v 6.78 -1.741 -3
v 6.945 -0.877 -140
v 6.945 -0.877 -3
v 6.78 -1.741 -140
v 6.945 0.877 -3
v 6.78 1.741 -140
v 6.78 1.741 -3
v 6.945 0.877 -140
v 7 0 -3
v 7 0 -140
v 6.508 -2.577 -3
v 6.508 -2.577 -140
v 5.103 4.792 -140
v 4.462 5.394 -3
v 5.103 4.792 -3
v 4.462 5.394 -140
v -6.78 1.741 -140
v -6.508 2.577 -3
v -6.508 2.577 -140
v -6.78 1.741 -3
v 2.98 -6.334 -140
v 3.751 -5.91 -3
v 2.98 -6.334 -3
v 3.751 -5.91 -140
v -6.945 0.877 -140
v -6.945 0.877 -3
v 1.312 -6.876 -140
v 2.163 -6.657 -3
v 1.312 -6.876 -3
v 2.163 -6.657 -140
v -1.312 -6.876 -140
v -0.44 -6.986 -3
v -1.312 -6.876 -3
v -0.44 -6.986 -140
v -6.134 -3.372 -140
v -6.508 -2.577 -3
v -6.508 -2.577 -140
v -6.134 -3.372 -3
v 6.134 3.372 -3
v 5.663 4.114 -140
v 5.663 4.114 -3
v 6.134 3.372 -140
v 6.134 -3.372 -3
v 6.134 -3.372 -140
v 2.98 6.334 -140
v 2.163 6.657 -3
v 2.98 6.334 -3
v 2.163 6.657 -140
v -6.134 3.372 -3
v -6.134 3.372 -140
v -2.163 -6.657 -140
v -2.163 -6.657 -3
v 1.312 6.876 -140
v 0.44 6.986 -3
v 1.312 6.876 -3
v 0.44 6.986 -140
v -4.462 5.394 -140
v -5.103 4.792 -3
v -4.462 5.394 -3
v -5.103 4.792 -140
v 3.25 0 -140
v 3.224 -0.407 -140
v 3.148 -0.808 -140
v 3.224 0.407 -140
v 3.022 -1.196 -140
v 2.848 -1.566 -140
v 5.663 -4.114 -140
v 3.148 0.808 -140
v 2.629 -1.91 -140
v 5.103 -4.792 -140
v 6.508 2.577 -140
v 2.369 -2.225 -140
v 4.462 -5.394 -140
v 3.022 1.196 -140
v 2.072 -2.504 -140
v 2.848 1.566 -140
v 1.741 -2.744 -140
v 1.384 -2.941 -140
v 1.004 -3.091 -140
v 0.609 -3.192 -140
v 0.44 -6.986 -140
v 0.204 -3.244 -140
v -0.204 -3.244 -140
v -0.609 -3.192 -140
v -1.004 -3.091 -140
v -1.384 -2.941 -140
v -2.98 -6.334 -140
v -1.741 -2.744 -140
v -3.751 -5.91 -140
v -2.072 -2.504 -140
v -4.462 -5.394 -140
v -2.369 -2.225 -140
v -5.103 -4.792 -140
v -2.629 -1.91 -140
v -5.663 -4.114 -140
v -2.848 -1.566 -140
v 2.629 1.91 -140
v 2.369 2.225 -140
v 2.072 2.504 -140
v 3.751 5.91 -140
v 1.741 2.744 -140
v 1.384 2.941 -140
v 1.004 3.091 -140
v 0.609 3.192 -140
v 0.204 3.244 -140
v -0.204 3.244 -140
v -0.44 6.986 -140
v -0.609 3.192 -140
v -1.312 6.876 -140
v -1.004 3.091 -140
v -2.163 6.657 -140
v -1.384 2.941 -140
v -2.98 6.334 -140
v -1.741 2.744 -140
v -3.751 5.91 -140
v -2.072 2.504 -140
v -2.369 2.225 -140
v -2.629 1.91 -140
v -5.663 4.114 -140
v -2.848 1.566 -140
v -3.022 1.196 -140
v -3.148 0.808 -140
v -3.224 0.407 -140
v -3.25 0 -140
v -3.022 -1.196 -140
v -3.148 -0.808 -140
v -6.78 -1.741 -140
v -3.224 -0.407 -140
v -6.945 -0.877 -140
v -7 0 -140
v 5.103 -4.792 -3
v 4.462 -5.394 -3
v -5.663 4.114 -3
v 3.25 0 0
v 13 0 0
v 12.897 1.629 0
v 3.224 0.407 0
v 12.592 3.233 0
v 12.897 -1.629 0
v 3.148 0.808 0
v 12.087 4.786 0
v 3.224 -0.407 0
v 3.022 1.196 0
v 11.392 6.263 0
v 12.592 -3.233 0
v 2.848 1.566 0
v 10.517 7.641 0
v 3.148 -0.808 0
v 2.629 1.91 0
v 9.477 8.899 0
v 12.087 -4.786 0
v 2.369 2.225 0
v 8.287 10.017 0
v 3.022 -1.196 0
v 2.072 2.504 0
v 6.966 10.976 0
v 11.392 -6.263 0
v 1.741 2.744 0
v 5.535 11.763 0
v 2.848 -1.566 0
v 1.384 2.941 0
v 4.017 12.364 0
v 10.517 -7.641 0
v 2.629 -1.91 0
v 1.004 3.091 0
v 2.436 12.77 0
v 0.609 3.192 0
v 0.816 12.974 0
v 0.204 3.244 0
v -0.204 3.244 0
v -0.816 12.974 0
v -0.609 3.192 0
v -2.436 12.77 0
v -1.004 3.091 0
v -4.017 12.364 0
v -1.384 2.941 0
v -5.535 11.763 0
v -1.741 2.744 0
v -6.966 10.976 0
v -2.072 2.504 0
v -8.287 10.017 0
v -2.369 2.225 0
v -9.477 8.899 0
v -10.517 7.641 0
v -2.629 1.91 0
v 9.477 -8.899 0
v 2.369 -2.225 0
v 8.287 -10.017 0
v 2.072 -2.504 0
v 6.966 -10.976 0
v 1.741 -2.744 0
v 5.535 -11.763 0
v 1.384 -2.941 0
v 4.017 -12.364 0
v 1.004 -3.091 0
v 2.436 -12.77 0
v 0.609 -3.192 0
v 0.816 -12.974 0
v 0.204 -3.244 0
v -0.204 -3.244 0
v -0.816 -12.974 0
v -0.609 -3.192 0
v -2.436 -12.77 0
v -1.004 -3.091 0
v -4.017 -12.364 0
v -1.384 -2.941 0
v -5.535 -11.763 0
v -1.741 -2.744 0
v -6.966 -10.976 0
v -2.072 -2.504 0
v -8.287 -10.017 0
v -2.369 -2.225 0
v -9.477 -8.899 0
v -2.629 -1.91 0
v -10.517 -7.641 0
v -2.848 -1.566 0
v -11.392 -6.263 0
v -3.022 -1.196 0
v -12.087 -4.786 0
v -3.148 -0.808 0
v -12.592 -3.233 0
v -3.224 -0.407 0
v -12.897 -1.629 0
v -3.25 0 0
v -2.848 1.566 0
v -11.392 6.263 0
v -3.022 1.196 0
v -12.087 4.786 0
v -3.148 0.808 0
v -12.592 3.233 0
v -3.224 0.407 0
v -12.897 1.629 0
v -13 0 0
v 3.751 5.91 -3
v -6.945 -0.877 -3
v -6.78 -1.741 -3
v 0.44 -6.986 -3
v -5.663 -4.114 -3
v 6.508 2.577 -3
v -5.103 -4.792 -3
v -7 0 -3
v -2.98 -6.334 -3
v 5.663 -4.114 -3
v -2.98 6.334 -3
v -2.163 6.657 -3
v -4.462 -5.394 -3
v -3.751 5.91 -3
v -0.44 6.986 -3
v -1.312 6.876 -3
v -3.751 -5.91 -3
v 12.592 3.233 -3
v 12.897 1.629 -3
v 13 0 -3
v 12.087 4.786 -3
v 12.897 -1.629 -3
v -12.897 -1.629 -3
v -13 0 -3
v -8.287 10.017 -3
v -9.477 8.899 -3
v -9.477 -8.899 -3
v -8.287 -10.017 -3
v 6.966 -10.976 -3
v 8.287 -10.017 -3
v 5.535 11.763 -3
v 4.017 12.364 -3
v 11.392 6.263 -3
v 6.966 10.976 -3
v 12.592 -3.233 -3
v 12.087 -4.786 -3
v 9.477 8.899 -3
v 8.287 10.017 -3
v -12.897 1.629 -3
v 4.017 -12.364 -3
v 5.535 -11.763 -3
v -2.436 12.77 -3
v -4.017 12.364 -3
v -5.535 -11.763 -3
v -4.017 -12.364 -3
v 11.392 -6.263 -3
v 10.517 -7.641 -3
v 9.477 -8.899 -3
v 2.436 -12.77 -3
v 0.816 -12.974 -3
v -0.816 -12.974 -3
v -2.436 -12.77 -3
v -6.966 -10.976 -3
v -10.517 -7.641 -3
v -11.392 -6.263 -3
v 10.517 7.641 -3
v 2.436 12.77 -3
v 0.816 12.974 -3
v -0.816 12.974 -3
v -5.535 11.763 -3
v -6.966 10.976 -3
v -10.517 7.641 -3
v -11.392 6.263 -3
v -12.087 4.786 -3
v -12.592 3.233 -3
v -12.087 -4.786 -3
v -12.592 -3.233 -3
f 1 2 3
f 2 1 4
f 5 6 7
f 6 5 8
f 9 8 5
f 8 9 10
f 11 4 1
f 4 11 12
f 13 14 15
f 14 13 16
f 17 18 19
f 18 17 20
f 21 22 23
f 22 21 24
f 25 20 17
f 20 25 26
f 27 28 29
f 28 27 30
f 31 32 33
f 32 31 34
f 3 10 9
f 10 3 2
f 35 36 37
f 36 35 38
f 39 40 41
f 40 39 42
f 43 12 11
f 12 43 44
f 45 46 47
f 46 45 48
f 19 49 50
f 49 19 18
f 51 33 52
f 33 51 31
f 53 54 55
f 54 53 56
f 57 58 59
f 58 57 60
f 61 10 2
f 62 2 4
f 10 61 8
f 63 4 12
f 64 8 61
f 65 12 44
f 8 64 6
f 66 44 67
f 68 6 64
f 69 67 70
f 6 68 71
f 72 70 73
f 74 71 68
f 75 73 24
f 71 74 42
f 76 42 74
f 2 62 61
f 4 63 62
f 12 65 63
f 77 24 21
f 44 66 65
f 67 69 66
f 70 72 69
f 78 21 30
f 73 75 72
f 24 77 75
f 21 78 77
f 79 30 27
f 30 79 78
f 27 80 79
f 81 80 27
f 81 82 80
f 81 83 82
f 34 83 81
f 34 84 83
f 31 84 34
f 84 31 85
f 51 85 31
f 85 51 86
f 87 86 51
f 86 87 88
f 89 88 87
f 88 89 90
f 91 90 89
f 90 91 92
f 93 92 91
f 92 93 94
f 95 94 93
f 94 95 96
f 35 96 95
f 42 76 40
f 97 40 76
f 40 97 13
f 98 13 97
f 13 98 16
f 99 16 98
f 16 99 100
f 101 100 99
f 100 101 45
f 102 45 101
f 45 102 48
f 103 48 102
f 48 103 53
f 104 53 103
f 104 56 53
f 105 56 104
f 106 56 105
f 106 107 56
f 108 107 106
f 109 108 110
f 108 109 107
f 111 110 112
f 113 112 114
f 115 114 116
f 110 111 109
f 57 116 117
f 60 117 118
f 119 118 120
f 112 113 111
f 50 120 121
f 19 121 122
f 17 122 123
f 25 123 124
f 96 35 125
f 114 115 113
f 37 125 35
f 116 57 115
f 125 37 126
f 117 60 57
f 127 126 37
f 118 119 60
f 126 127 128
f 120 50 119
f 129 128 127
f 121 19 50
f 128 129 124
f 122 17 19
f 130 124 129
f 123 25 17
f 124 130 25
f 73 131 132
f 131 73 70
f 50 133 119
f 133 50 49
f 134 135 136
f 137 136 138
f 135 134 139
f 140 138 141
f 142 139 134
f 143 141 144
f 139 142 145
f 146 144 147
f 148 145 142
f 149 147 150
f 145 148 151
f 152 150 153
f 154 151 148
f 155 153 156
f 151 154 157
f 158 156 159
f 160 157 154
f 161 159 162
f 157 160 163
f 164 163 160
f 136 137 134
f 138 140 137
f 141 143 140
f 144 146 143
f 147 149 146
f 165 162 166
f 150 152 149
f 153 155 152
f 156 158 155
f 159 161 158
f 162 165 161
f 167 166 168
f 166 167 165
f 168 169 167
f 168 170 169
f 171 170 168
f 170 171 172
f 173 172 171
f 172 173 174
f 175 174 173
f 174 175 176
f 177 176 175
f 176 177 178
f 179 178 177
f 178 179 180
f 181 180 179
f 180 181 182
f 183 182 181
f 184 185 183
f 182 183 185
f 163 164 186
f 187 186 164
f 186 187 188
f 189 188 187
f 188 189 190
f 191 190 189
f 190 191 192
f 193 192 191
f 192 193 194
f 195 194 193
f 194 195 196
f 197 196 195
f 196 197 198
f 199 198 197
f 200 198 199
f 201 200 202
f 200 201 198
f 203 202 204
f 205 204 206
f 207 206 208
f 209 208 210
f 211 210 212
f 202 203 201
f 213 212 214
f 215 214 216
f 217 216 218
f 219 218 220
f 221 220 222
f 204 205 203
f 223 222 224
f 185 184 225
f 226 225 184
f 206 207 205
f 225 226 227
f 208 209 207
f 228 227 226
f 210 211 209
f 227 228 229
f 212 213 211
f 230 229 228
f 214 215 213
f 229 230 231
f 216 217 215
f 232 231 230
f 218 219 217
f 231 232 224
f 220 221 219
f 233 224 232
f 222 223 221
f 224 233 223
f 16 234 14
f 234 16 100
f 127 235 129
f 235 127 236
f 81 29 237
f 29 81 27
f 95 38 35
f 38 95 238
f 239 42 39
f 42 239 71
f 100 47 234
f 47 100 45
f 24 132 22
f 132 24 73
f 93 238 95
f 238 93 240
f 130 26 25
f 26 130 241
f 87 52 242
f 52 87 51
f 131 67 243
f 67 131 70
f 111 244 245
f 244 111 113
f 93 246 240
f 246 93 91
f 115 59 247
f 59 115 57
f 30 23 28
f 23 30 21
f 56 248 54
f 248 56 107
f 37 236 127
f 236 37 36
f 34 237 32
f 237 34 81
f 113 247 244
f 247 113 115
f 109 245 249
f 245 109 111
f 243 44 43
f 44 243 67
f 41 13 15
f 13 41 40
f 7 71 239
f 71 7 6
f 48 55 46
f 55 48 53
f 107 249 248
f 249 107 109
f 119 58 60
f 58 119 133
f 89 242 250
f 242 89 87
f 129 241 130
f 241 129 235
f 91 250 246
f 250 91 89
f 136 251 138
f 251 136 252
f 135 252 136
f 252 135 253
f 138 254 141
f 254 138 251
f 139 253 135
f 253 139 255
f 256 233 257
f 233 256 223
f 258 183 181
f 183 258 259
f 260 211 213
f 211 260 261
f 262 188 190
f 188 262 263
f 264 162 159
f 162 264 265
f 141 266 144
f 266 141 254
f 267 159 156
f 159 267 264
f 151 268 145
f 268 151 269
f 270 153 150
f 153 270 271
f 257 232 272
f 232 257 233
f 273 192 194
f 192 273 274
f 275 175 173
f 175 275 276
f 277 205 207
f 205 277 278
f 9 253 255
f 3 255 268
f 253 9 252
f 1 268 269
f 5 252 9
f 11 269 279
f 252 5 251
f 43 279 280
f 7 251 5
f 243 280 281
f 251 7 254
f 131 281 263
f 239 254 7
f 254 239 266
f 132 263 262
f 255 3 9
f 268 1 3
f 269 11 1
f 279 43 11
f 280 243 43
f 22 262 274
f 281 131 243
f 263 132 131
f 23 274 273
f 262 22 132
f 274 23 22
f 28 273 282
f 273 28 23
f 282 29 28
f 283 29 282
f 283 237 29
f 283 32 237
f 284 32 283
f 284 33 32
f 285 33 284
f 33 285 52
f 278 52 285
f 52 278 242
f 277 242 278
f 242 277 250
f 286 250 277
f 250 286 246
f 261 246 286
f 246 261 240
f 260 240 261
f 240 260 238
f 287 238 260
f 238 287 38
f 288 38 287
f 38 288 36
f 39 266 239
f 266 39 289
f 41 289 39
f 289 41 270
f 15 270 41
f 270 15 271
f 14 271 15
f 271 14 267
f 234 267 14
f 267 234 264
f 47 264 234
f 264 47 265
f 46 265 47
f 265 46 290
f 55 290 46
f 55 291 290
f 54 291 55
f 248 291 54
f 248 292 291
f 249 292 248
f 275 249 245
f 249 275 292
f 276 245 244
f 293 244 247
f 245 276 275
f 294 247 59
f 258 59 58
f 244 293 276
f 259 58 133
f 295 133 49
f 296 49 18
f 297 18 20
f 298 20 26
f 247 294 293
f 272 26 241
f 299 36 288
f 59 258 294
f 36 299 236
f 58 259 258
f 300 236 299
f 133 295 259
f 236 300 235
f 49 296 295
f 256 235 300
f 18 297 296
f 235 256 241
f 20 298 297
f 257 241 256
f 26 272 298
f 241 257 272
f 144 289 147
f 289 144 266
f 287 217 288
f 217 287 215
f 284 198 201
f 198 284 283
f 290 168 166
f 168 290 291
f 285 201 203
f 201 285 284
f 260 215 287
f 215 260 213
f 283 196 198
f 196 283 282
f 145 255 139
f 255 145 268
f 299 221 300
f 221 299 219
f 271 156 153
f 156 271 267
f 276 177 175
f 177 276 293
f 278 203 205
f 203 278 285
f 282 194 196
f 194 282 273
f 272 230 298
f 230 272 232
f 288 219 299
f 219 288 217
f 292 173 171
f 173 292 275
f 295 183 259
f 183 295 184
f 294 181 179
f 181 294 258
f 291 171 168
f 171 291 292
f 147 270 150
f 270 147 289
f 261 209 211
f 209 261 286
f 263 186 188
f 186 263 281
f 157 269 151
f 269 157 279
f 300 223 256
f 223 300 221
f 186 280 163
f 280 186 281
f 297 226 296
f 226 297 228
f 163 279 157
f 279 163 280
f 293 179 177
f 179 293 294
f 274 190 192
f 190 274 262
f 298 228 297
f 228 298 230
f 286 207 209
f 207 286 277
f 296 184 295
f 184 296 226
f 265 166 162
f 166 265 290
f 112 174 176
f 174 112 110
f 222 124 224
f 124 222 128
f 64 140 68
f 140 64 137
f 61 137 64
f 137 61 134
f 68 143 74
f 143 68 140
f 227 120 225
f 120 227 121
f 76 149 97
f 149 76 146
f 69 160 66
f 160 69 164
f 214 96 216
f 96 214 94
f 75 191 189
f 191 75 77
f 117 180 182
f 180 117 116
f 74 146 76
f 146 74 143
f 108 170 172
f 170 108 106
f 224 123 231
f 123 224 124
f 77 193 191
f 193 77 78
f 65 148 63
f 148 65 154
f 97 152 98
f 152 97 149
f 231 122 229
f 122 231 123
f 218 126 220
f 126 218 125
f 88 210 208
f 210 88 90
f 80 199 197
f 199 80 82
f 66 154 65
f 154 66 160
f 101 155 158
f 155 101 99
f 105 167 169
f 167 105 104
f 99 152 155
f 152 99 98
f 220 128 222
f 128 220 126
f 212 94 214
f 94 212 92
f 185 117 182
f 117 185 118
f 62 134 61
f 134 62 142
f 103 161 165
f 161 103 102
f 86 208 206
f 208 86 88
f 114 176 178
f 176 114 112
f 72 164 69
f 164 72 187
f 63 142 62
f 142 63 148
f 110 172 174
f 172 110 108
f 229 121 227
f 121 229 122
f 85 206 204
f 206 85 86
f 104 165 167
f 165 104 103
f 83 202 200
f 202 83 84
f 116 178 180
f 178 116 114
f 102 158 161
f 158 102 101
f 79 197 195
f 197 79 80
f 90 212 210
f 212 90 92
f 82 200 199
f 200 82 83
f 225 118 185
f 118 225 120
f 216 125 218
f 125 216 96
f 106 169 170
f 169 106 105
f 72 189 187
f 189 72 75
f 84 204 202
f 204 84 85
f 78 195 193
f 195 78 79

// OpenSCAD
$fn = 50;


difference() {
	union() {
		translate(v = [0, 0, -140.0000000000]) {
			cylinder(h = 140, r = 7.0000000000);
		}
		translate(v = [0, 0, -3.0000000000]) {
			cylinder(h = 3, r = 13.0000000000);
		}
	}
	union() {
		#translate(v = [0, 0, -140]) {
			cylinder(h = 140, r = 3.2500000000);
		}
	}
}
